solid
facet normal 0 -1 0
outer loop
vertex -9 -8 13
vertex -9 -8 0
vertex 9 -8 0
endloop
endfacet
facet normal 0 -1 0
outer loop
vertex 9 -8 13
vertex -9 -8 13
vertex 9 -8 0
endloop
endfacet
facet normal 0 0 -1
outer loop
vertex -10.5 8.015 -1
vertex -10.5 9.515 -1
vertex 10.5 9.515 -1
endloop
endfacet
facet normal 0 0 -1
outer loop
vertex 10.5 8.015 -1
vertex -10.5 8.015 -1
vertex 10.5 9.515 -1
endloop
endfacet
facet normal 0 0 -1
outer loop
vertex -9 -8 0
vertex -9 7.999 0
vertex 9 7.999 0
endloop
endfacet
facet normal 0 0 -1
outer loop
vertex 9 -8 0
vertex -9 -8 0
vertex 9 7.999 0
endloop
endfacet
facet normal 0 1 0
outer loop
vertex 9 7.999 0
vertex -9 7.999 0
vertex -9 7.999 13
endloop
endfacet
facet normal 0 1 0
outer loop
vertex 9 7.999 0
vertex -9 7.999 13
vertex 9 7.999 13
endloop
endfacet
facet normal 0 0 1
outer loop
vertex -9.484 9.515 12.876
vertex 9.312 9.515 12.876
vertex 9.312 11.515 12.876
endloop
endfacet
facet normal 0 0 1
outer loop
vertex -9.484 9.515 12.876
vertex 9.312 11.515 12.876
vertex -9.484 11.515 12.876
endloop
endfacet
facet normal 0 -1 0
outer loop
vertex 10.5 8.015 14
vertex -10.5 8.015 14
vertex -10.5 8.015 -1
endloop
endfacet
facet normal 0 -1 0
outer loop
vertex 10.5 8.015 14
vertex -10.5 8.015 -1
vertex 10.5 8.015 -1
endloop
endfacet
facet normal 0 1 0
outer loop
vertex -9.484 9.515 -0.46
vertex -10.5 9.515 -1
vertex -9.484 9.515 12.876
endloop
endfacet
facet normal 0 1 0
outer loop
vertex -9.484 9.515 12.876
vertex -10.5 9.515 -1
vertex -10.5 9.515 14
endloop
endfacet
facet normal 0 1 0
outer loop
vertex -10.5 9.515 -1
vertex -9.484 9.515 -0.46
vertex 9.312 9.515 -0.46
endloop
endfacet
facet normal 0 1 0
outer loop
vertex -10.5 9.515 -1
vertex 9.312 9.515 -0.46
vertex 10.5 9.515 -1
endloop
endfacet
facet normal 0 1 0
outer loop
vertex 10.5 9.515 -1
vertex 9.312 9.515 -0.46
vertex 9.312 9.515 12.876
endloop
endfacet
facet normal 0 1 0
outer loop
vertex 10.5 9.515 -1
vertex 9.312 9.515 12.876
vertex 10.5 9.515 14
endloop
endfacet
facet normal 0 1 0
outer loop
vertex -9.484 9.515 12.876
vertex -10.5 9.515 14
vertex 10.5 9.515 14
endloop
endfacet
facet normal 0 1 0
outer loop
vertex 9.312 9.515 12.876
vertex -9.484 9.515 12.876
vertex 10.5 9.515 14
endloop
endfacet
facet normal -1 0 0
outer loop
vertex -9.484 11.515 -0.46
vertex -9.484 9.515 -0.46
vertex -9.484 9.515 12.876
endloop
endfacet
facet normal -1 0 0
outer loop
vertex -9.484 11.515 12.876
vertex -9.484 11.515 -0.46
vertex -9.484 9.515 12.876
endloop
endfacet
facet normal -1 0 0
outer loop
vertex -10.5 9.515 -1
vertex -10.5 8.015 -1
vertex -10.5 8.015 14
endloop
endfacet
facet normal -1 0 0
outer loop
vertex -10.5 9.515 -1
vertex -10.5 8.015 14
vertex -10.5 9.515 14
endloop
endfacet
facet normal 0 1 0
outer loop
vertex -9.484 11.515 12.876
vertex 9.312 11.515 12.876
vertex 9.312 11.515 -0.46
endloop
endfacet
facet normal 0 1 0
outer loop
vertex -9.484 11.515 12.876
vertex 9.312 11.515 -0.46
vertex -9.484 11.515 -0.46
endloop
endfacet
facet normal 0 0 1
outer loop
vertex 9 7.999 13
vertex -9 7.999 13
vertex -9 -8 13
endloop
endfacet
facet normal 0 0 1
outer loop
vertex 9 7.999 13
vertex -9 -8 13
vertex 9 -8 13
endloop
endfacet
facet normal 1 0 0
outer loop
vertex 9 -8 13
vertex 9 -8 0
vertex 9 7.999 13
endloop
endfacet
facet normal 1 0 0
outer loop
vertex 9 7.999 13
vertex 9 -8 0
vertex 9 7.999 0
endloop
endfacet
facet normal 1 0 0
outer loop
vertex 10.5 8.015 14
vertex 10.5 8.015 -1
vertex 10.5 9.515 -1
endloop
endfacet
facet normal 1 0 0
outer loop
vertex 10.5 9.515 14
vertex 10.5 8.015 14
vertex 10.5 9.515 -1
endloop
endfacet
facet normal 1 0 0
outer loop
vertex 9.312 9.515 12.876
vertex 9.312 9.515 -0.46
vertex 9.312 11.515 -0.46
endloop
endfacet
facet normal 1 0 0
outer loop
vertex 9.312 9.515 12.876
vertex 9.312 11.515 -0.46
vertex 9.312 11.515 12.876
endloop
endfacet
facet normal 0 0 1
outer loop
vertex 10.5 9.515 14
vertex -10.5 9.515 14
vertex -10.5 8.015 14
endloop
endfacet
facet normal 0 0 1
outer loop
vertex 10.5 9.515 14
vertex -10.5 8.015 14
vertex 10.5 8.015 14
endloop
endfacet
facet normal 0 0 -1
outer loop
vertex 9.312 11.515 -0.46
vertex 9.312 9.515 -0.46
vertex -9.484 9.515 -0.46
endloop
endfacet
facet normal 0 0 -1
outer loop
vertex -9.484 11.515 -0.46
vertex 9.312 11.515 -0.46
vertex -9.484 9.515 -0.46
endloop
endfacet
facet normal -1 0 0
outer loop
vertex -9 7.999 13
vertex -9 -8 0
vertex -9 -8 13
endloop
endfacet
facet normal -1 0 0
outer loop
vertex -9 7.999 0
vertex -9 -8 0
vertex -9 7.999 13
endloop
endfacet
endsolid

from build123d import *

# Parameters (mm, degrees)
F0_W          = 18
F0_H          = 15.998654
F1_DEPTH      = 13
F2_W          = 21
F2_H          = 1.5
F3_DEPTH      = 14
F3_DEPTH_BACK = 1
F4_W          = 18.796534
F4_H          = 13.335767
F5_DEPTH      = 2


with BuildPart() as f1:
    # F0 (on Top) → F1 (new body)
    with BuildSketch(Plane.XY):
        with Locations((0, -0.000673)):
            Rectangle(F0_W, F0_H)
    extrude(amount=F1_DEPTH)


with BuildPart() as f3:
    # F2 (on Top) → F3 (new body, two sides)
    with BuildSketch(Plane.XY) as f3_sk:
        with Locations((0, 8.765125)):
            Rectangle(F2_W, F2_H)
    extrude(amount=F3_DEPTH)
    extrude(f3_sk.sketch, amount=-F3_DEPTH_BACK)

    # F4 (on face) → F5 (join)
    with BuildSketch(Plane(origin=(0, 9.515125, 0), x_dir=(-1, 0, 0), z_dir=(0, 1, 0))):
        with Locations((0.086222, 6.208029)):
            Rectangle(F4_W, F4_H)
    extrude(amount=F5_DEPTH)


solid = Compound([f1.part, f3.part])
